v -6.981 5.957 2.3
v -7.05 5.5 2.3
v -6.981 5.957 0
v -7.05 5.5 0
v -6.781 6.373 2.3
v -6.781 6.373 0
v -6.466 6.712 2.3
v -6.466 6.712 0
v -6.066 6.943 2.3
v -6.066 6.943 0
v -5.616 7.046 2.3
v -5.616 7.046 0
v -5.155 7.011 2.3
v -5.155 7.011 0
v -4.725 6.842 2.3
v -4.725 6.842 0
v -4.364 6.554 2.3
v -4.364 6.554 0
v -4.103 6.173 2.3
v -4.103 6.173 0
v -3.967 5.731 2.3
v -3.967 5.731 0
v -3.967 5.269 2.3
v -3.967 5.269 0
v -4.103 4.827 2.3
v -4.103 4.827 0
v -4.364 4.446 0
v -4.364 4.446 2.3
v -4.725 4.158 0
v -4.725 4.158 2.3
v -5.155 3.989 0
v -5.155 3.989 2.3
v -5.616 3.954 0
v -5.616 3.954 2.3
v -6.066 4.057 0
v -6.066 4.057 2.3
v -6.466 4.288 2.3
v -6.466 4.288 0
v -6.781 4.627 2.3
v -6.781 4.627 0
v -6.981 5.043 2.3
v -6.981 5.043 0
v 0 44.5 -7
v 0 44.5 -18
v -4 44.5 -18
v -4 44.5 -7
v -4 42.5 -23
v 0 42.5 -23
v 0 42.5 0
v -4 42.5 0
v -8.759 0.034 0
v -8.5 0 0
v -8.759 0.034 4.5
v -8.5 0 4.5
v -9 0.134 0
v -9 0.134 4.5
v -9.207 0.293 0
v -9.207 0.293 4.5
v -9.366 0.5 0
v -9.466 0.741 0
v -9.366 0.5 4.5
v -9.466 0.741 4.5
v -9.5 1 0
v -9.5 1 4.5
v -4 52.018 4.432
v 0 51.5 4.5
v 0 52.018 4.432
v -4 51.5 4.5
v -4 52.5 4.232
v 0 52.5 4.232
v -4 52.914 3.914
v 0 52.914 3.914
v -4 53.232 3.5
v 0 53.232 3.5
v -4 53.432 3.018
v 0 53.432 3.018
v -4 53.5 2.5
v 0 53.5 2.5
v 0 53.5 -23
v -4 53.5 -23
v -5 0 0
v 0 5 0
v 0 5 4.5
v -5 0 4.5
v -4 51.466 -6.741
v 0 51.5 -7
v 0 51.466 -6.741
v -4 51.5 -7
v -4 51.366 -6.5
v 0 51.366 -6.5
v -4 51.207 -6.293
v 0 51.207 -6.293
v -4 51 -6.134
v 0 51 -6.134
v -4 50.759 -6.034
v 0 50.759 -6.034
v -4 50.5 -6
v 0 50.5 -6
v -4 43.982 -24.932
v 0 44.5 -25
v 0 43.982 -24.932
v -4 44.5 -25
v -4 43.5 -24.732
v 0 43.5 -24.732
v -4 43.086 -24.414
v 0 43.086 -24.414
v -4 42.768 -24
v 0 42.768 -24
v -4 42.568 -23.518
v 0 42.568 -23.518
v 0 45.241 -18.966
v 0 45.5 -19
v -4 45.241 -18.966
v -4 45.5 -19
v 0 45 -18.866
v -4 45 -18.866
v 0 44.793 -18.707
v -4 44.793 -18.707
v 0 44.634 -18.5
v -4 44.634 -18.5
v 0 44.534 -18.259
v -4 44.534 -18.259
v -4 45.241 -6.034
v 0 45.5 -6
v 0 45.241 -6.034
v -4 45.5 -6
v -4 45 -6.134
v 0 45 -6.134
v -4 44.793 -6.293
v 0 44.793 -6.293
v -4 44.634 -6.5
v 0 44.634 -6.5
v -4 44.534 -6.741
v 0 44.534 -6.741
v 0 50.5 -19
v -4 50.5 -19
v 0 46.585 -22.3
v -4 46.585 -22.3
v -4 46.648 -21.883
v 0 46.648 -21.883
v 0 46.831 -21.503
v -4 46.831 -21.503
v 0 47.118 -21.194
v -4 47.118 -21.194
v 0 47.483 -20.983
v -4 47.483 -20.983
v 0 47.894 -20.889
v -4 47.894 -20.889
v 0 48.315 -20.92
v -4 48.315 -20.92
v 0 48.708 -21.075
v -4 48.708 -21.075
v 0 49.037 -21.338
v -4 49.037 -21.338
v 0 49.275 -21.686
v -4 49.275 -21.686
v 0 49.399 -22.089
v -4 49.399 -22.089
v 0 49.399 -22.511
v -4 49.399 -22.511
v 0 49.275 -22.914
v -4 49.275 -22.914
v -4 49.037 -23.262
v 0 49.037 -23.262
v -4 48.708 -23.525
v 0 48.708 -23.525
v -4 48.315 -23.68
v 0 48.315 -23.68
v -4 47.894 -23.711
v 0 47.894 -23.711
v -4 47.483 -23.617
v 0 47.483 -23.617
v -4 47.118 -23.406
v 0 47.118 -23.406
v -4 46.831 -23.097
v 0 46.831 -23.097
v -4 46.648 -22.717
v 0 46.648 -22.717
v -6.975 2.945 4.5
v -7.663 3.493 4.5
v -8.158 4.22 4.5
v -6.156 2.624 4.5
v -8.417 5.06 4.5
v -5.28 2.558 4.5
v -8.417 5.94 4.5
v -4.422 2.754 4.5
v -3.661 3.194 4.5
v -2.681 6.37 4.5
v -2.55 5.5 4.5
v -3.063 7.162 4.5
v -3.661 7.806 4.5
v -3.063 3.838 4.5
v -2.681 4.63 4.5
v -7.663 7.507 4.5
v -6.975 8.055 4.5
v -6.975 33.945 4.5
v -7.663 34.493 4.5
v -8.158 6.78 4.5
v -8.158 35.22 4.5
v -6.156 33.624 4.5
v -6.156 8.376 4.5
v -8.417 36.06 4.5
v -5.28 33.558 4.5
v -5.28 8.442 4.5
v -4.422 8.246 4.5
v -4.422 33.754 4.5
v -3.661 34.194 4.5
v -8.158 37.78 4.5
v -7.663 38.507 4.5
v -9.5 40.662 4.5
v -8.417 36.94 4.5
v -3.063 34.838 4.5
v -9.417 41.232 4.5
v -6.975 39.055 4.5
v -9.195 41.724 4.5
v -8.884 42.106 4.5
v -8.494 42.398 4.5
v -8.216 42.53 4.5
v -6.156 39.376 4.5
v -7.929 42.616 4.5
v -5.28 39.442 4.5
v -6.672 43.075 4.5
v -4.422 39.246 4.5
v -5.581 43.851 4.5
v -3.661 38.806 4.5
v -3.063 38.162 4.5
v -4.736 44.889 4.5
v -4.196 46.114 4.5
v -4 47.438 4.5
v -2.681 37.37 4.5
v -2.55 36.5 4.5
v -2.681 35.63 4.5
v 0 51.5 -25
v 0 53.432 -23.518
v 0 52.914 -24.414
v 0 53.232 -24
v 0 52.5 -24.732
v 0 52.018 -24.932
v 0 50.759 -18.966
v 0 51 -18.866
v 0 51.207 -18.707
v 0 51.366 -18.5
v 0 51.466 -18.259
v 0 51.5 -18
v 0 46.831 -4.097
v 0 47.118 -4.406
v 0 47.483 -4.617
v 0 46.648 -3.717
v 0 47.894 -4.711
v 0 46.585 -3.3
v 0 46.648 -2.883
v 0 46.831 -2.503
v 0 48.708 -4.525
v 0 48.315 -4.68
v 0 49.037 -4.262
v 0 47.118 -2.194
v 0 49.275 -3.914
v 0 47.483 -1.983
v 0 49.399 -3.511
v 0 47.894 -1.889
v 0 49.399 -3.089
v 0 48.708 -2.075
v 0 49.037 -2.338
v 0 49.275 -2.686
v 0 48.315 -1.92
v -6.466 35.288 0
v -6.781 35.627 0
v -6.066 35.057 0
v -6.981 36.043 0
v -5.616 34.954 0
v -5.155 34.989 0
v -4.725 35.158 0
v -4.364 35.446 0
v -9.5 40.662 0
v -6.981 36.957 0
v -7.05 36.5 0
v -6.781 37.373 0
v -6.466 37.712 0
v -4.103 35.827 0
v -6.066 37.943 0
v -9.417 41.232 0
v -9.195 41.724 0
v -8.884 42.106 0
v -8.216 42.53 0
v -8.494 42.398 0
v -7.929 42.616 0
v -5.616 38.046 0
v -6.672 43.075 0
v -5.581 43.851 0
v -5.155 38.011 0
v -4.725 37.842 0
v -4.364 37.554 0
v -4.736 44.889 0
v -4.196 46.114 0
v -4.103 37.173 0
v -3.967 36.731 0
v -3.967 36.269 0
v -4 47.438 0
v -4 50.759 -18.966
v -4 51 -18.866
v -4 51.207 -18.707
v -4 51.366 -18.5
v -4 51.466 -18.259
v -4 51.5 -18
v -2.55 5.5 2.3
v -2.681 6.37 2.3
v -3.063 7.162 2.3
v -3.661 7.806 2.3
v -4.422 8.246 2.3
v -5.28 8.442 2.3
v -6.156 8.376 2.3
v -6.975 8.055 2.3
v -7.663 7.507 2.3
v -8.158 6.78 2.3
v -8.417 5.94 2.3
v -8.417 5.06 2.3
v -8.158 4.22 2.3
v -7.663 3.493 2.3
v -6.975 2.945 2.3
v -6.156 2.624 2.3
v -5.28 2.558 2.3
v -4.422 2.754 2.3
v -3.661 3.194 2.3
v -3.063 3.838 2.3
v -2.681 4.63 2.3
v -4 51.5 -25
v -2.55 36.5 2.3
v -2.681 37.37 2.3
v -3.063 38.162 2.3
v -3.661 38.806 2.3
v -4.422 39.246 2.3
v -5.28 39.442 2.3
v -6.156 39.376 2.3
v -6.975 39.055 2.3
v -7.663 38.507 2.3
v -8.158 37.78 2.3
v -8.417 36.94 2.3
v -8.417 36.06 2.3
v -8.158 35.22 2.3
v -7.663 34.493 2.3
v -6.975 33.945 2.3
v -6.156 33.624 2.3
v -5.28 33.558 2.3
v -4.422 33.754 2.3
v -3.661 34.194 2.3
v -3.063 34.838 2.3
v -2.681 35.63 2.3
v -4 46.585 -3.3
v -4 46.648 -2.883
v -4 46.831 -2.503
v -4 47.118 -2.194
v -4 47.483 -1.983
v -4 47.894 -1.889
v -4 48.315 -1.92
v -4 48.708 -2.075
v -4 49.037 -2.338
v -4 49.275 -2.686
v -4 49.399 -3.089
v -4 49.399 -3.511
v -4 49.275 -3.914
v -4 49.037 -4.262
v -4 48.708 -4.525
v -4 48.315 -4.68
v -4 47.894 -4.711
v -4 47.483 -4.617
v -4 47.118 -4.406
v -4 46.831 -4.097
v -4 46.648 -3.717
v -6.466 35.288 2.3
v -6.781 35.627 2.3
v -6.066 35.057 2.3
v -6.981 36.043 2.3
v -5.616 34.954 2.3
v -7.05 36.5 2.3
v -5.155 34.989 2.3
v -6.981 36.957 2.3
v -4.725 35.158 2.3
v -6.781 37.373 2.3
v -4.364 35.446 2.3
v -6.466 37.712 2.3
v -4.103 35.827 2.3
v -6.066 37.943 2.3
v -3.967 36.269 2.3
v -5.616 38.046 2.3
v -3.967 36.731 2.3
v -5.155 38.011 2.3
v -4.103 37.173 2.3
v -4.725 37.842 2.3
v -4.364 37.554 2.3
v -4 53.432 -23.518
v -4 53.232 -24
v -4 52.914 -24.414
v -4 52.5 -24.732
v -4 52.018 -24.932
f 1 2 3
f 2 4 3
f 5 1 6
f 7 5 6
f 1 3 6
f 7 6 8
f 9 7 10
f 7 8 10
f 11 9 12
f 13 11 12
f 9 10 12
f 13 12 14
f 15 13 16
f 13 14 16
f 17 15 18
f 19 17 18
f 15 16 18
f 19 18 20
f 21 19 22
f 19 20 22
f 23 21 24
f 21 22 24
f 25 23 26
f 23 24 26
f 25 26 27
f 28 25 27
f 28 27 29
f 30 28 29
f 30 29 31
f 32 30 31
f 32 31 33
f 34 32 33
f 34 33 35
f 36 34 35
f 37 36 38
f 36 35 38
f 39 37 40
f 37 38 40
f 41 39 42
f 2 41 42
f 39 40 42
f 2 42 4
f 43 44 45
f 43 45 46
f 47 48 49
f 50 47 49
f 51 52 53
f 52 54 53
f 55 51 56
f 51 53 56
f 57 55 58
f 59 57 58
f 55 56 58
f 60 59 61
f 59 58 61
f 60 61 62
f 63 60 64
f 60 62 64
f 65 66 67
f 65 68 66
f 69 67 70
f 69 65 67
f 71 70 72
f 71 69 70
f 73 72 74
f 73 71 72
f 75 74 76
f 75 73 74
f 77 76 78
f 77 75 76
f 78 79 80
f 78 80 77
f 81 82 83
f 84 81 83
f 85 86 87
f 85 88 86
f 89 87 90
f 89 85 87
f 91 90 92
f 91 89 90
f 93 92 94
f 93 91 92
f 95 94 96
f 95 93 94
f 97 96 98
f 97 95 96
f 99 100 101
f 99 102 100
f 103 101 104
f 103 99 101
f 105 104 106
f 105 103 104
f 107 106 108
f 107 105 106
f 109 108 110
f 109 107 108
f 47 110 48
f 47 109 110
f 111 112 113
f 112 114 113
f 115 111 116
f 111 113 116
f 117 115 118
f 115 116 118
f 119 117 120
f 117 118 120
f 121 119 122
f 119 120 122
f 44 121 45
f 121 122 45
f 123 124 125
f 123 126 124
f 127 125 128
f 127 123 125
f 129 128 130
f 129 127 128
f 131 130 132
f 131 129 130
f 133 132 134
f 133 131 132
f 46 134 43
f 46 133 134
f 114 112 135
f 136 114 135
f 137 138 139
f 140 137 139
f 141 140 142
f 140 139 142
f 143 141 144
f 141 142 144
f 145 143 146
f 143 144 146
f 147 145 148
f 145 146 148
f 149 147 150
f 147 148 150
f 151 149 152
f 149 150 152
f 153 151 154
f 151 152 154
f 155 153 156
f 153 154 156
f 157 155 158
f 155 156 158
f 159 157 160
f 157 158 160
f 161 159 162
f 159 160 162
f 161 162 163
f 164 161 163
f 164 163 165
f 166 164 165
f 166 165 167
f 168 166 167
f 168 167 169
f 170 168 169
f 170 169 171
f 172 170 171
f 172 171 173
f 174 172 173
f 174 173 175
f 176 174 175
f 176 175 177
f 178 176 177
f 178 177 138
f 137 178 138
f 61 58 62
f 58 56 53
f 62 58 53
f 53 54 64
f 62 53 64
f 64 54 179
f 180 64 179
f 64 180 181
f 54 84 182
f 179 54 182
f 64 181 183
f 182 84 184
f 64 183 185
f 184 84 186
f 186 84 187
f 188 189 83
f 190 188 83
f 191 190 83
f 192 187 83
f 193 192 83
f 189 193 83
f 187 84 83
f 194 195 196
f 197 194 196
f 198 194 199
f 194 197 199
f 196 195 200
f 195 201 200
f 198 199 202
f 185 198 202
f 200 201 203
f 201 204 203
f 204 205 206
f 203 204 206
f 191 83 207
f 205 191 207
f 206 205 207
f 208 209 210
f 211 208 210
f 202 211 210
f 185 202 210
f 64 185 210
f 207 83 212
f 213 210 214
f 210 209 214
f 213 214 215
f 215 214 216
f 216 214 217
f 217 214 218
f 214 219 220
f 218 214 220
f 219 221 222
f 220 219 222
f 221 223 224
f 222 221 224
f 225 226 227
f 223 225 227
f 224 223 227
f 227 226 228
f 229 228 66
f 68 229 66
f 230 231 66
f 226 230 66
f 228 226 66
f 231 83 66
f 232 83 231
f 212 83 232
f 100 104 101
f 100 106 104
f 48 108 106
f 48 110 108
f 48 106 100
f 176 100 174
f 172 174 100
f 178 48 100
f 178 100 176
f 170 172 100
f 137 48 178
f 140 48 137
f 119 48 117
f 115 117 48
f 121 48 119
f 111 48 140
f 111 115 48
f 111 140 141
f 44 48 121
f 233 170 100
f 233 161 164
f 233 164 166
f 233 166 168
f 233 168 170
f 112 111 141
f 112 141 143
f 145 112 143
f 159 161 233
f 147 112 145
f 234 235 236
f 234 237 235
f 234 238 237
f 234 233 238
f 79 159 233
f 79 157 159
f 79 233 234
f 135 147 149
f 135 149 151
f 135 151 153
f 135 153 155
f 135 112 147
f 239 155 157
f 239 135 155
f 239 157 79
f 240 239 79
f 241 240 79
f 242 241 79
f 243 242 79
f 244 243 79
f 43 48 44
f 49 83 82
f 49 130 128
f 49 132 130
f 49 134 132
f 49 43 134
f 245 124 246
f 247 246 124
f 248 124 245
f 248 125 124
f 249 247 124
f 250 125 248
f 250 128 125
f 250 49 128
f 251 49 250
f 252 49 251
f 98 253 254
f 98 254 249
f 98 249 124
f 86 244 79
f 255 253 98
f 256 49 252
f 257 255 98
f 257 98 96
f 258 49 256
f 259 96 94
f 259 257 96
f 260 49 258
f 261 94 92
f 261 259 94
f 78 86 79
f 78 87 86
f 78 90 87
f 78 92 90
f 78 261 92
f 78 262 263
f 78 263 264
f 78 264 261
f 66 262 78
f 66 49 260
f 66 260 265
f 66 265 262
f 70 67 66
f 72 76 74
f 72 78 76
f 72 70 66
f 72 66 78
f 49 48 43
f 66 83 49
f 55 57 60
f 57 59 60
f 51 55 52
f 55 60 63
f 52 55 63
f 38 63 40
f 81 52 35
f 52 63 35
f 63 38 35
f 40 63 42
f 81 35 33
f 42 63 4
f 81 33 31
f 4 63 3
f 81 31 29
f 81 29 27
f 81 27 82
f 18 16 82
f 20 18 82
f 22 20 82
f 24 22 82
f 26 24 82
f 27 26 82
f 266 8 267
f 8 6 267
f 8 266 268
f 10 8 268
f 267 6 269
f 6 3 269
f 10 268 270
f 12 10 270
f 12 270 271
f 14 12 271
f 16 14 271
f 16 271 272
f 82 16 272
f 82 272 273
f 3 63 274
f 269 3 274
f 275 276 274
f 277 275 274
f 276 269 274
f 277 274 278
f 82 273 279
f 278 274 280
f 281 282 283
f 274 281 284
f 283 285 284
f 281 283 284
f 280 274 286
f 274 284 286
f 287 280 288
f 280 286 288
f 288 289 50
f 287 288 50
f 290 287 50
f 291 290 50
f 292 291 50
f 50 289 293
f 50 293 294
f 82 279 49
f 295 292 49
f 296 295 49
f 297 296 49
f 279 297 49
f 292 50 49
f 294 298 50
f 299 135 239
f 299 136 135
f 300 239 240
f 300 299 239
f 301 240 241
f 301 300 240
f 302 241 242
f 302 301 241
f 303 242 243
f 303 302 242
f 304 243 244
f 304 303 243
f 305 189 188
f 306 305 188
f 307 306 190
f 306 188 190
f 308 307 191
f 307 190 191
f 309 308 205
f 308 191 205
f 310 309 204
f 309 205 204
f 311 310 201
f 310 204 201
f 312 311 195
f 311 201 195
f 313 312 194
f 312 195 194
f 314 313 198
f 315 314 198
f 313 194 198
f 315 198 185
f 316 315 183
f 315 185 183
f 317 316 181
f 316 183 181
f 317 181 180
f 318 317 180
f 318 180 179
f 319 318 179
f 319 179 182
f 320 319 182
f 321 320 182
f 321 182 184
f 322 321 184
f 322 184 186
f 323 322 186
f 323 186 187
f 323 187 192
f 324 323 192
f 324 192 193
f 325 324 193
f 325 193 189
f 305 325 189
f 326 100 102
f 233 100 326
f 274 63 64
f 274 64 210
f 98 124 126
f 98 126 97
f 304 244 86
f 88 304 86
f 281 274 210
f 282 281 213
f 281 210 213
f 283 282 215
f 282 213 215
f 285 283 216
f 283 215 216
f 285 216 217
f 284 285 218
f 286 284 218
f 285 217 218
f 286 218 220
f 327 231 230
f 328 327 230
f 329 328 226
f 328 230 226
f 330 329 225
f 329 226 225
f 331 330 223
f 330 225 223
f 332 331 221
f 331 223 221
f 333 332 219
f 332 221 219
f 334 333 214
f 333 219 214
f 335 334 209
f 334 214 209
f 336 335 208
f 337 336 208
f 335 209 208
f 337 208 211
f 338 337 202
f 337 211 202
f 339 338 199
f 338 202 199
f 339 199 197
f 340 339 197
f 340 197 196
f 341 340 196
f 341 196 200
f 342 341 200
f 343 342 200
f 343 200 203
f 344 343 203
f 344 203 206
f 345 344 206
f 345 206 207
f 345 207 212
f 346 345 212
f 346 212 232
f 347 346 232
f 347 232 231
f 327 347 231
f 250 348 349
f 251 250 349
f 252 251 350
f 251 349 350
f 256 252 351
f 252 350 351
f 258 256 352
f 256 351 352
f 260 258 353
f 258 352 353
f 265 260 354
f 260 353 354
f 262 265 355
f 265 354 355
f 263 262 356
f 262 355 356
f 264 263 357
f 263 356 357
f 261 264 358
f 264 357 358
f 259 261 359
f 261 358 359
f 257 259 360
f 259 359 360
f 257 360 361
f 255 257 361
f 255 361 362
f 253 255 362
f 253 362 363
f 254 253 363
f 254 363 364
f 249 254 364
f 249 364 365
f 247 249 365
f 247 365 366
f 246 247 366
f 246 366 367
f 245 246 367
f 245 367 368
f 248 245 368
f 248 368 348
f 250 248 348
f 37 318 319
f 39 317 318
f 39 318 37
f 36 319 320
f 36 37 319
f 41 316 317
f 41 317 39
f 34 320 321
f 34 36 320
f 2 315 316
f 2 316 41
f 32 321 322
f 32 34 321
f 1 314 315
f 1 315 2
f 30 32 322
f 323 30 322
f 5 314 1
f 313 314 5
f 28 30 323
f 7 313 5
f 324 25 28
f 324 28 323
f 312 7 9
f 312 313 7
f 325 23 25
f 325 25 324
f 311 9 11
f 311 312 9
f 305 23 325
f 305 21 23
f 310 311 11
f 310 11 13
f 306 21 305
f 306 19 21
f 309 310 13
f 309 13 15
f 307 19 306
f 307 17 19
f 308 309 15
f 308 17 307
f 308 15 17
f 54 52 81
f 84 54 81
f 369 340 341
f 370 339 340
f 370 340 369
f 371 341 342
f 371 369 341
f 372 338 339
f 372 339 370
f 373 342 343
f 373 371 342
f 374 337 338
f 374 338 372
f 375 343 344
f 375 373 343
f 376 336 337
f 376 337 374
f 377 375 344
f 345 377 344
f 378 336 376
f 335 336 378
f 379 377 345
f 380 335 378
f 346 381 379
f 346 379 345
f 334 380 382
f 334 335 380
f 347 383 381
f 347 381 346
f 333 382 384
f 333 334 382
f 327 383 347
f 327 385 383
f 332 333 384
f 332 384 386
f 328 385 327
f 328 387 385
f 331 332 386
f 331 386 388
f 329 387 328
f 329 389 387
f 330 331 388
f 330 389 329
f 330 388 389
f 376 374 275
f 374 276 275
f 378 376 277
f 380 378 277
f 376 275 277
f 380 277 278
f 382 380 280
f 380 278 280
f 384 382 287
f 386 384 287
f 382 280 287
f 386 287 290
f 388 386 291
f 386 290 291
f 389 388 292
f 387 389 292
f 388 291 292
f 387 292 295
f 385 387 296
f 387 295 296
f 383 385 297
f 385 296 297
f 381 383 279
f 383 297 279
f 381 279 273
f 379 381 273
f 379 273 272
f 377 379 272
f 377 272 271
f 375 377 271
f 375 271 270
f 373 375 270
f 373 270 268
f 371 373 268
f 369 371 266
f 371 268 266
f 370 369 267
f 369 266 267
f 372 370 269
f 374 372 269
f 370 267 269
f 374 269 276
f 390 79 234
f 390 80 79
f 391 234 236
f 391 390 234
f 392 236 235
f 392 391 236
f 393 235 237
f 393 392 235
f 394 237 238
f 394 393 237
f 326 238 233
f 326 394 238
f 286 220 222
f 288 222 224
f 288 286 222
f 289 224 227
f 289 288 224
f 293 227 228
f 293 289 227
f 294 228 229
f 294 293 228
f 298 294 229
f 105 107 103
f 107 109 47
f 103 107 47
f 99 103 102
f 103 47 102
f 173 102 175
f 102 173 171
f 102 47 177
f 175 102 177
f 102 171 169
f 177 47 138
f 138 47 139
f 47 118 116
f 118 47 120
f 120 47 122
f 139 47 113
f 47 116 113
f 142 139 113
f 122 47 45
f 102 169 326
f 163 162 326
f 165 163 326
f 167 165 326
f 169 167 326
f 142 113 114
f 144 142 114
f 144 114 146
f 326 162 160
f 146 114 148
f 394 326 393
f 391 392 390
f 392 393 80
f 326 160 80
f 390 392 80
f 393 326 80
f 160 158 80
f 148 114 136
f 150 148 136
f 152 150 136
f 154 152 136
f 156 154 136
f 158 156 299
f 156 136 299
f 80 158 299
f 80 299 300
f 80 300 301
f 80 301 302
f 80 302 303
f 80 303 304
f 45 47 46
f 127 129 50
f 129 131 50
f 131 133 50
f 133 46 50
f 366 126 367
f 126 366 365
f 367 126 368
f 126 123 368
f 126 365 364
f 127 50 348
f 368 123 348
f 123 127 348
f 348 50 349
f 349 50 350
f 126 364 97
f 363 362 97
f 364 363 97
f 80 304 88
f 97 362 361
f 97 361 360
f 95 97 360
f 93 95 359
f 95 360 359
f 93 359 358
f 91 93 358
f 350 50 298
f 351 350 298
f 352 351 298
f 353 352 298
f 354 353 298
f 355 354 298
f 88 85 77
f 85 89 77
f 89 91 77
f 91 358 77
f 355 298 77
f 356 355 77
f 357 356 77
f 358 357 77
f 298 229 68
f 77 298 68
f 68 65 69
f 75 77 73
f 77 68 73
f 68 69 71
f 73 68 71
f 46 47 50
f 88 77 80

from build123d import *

# Parameters (mm, degrees)
F0_W           = 9.5
F0_H           = 42.5
F1_DEPTH       = 4.5
F3_D           = 3.1
F3_CBORE_D     = 5.9
F3_CBORE_DEPTH = 2.2
F4_W           = 11
F4_H           = 29.5
F5_DEPTH       = 4
F7_D           = 2.83
F8_W           = 7
F8_H           = 13
F9_DEPTH       = 25
F10_T1_DEPTH   = 4.5
F11_R          = 2
F12_SIZE       = 5
F13_R          = 1


# Not quite as in the source:
# - a fillet or chamfer that OpenCascade refuses, or shapes differently, is made with other operations: its cross-section is extruded or revolved along the edge and cut away or added


with BuildPart() as f1:
    # F0 (on Top) → F1 (new body)
    with BuildSketch(Plane.XY):
        with Locations((-4.75, 21.25)):
            Rectangle(F0_W, F0_H)
    extrude(amount=F1_DEPTH)

    # F3 (through all)
    with Locations(Plane.XY.offset(4.5)):
        with Locations((-5.5, 36.5), (-5.5, 5.5)):
            CounterBoreHole(F3_D / 2, F3_CBORE_D / 2, F3_CBORE_DEPTH)

    # F4 (on Right) → F5 (join)
    with BuildSketch(Plane.YZ):
        with Locations((48, -10.25)):
            Rectangle(F4_W, F4_H)
    extrude(amount=-F5_DEPTH)

    # F7 (through all)
    with Locations(Plane.YZ):
        with Locations((48, -3.3), (48, -22.3)):
            Hole(F7_D / 2)

    # F8 (on face) → F9 (cut)
    with BuildSketch(Plane.YZ):
        with Locations((48, -12.5)):
            Rectangle(F8_W, F8_H)
    extrude(amount=-F9_DEPTH, mode=Mode.SUBTRACT)

    # F10: fillet of radius 5 on 1 edges, made by hand

    # F10_s2 → F10_t1 (join)
    with BuildSketch(Plane.XY):
        with BuildLine():
            ThreePointArc((-9.0009656854, 42.4996), (-5.4644660941, 43.9644660941), (-3.9996, 47.5009656854))
            Line((-3.9996, 47.5009656854), (-3.4994634315, 47.5009656854))
            ThreePointArc((-3.4994634315, 47.5009656854), (-3.4998634315, 45.0004828427), (-3.4998634315, 42.5))
            Line((-3.4998634315, 42.5), (-4, 41.9998634315))
            ThreePointArc((-4, 41.9998634315), (-6.5004828427, 41.9998634315), (-9.0009656854, 41.9994634315))
            Line((-9.0009656854, 41.9994634315), (-9.0009656854, 42.4996))
        make_face()
    extrude(amount=F10_T1_DEPTH)

    # F11
    f11_edges = [f1.edges().sort_by_distance(p)[0] for p in [
        (-2, 53.5, 4.5),
        (-2, 53.5, -25),
        (-2, 42.5, -25),
        (-9.5, 42.5, 2.25),
    ]]
    fillet(f11_edges, radius=F11_R)

    # F12
    f12_edges = [f1.edges().sort_by_distance(p)[0] for p in [
        (0, 0, 2.25),
    ]]
    chamfer(f12_edges, length=F12_SIZE)

    # F13
    f13_edges = [f1.edges().sort_by_distance(p)[0] for p in [
        (-2, 44.5, -6),
        (-2, 51.5, -6),
        (-2, 44.5, -19),
        (-2, 51.5, -19),
        (-9.5, 0, 2.25),
    ]]
    fillet(f13_edges, radius=F13_R)


solid = f1.part
